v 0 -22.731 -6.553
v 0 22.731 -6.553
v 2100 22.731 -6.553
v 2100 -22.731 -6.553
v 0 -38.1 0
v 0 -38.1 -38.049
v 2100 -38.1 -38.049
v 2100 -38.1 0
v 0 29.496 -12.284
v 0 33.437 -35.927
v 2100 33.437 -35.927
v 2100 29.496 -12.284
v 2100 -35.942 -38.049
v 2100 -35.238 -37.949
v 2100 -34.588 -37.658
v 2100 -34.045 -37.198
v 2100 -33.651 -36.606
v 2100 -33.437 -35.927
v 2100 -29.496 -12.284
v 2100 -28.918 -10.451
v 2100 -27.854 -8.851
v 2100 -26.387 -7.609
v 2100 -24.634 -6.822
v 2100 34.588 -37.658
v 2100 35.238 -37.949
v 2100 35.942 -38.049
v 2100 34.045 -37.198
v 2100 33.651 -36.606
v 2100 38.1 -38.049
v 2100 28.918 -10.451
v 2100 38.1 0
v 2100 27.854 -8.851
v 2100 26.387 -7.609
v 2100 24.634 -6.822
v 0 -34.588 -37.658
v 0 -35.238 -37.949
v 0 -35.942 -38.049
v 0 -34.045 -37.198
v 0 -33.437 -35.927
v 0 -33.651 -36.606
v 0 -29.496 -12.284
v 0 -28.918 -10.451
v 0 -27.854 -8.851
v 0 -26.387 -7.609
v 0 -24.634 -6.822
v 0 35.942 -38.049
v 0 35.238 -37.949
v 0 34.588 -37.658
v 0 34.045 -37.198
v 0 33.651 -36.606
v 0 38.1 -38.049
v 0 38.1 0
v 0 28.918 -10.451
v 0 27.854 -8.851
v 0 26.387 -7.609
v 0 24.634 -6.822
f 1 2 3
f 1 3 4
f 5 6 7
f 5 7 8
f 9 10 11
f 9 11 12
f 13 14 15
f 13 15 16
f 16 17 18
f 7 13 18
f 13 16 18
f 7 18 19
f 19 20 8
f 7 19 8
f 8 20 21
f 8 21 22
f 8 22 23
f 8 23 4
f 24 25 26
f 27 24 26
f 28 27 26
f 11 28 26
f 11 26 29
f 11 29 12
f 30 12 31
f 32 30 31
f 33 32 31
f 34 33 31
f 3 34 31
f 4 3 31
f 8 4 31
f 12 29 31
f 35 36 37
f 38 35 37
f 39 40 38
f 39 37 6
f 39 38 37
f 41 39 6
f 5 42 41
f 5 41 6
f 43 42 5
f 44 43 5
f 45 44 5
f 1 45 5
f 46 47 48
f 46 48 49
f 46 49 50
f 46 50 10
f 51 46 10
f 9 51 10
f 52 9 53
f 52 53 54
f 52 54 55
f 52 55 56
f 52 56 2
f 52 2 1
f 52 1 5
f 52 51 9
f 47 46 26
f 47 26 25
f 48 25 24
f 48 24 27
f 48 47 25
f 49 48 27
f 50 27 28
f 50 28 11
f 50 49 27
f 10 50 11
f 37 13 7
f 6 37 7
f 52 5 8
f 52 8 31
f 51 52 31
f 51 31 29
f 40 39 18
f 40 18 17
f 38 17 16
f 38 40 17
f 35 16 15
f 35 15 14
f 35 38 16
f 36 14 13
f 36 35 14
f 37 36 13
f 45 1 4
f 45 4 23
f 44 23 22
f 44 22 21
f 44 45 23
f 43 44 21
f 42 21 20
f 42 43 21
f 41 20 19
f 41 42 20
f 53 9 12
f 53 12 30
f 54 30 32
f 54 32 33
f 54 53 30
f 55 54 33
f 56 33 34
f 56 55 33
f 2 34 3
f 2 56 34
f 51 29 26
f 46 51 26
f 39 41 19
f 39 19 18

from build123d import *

# Parameters (mm, degrees)
CANAL_C_3_X_5_1_DEPTH = 2100


with BuildPart() as part:
    # Sketch12 → Canal c 3 X 5(1) (new body)
    with BuildSketch(Plane(origin=(0, 0, 0), x_dir=(0, 0, -1), z_dir=(1, 0, 0))):
        with BuildLine():
            Line((0, -38.1), (0, 38.1))
            Line((0, 38.1), (38.0492, 38.1))
            Line((38.0492, 38.1), (38.0492, 35.942335136))
            ThreePointArc((38.0492, 35.942335136), (37.447280466, 34.300554363), (35.926803066, 33.436899509))
            Line((35.926803066, 33.436899509), (12.283671721, 29.496090157))
            ThreePointArc((12.283671721, 29.496090157), (8.178382741, 27.164222052), (6.5532, 22.731413966))
            Line((6.5532, 22.731413966), (6.5532, -22.731413966))
            ThreePointArc((6.5532, -22.731413966), (8.178382741, -27.164222052), (12.283671721, -29.496090157))
            Line((12.283671721, -29.496090157), (35.926803066, -33.436899509))
            ThreePointArc((35.926803066, -33.436899509), (37.447280466, -34.300554363), (38.0492, -35.942335136))
            Line((38.0492, -35.942335136), (38.0492, -38.1))
            Line((38.0492, -38.1), (0, -38.1))
        make_face()
    extrude(amount=CANAL_C_3_X_5_1_DEPTH)


solid = part.part
